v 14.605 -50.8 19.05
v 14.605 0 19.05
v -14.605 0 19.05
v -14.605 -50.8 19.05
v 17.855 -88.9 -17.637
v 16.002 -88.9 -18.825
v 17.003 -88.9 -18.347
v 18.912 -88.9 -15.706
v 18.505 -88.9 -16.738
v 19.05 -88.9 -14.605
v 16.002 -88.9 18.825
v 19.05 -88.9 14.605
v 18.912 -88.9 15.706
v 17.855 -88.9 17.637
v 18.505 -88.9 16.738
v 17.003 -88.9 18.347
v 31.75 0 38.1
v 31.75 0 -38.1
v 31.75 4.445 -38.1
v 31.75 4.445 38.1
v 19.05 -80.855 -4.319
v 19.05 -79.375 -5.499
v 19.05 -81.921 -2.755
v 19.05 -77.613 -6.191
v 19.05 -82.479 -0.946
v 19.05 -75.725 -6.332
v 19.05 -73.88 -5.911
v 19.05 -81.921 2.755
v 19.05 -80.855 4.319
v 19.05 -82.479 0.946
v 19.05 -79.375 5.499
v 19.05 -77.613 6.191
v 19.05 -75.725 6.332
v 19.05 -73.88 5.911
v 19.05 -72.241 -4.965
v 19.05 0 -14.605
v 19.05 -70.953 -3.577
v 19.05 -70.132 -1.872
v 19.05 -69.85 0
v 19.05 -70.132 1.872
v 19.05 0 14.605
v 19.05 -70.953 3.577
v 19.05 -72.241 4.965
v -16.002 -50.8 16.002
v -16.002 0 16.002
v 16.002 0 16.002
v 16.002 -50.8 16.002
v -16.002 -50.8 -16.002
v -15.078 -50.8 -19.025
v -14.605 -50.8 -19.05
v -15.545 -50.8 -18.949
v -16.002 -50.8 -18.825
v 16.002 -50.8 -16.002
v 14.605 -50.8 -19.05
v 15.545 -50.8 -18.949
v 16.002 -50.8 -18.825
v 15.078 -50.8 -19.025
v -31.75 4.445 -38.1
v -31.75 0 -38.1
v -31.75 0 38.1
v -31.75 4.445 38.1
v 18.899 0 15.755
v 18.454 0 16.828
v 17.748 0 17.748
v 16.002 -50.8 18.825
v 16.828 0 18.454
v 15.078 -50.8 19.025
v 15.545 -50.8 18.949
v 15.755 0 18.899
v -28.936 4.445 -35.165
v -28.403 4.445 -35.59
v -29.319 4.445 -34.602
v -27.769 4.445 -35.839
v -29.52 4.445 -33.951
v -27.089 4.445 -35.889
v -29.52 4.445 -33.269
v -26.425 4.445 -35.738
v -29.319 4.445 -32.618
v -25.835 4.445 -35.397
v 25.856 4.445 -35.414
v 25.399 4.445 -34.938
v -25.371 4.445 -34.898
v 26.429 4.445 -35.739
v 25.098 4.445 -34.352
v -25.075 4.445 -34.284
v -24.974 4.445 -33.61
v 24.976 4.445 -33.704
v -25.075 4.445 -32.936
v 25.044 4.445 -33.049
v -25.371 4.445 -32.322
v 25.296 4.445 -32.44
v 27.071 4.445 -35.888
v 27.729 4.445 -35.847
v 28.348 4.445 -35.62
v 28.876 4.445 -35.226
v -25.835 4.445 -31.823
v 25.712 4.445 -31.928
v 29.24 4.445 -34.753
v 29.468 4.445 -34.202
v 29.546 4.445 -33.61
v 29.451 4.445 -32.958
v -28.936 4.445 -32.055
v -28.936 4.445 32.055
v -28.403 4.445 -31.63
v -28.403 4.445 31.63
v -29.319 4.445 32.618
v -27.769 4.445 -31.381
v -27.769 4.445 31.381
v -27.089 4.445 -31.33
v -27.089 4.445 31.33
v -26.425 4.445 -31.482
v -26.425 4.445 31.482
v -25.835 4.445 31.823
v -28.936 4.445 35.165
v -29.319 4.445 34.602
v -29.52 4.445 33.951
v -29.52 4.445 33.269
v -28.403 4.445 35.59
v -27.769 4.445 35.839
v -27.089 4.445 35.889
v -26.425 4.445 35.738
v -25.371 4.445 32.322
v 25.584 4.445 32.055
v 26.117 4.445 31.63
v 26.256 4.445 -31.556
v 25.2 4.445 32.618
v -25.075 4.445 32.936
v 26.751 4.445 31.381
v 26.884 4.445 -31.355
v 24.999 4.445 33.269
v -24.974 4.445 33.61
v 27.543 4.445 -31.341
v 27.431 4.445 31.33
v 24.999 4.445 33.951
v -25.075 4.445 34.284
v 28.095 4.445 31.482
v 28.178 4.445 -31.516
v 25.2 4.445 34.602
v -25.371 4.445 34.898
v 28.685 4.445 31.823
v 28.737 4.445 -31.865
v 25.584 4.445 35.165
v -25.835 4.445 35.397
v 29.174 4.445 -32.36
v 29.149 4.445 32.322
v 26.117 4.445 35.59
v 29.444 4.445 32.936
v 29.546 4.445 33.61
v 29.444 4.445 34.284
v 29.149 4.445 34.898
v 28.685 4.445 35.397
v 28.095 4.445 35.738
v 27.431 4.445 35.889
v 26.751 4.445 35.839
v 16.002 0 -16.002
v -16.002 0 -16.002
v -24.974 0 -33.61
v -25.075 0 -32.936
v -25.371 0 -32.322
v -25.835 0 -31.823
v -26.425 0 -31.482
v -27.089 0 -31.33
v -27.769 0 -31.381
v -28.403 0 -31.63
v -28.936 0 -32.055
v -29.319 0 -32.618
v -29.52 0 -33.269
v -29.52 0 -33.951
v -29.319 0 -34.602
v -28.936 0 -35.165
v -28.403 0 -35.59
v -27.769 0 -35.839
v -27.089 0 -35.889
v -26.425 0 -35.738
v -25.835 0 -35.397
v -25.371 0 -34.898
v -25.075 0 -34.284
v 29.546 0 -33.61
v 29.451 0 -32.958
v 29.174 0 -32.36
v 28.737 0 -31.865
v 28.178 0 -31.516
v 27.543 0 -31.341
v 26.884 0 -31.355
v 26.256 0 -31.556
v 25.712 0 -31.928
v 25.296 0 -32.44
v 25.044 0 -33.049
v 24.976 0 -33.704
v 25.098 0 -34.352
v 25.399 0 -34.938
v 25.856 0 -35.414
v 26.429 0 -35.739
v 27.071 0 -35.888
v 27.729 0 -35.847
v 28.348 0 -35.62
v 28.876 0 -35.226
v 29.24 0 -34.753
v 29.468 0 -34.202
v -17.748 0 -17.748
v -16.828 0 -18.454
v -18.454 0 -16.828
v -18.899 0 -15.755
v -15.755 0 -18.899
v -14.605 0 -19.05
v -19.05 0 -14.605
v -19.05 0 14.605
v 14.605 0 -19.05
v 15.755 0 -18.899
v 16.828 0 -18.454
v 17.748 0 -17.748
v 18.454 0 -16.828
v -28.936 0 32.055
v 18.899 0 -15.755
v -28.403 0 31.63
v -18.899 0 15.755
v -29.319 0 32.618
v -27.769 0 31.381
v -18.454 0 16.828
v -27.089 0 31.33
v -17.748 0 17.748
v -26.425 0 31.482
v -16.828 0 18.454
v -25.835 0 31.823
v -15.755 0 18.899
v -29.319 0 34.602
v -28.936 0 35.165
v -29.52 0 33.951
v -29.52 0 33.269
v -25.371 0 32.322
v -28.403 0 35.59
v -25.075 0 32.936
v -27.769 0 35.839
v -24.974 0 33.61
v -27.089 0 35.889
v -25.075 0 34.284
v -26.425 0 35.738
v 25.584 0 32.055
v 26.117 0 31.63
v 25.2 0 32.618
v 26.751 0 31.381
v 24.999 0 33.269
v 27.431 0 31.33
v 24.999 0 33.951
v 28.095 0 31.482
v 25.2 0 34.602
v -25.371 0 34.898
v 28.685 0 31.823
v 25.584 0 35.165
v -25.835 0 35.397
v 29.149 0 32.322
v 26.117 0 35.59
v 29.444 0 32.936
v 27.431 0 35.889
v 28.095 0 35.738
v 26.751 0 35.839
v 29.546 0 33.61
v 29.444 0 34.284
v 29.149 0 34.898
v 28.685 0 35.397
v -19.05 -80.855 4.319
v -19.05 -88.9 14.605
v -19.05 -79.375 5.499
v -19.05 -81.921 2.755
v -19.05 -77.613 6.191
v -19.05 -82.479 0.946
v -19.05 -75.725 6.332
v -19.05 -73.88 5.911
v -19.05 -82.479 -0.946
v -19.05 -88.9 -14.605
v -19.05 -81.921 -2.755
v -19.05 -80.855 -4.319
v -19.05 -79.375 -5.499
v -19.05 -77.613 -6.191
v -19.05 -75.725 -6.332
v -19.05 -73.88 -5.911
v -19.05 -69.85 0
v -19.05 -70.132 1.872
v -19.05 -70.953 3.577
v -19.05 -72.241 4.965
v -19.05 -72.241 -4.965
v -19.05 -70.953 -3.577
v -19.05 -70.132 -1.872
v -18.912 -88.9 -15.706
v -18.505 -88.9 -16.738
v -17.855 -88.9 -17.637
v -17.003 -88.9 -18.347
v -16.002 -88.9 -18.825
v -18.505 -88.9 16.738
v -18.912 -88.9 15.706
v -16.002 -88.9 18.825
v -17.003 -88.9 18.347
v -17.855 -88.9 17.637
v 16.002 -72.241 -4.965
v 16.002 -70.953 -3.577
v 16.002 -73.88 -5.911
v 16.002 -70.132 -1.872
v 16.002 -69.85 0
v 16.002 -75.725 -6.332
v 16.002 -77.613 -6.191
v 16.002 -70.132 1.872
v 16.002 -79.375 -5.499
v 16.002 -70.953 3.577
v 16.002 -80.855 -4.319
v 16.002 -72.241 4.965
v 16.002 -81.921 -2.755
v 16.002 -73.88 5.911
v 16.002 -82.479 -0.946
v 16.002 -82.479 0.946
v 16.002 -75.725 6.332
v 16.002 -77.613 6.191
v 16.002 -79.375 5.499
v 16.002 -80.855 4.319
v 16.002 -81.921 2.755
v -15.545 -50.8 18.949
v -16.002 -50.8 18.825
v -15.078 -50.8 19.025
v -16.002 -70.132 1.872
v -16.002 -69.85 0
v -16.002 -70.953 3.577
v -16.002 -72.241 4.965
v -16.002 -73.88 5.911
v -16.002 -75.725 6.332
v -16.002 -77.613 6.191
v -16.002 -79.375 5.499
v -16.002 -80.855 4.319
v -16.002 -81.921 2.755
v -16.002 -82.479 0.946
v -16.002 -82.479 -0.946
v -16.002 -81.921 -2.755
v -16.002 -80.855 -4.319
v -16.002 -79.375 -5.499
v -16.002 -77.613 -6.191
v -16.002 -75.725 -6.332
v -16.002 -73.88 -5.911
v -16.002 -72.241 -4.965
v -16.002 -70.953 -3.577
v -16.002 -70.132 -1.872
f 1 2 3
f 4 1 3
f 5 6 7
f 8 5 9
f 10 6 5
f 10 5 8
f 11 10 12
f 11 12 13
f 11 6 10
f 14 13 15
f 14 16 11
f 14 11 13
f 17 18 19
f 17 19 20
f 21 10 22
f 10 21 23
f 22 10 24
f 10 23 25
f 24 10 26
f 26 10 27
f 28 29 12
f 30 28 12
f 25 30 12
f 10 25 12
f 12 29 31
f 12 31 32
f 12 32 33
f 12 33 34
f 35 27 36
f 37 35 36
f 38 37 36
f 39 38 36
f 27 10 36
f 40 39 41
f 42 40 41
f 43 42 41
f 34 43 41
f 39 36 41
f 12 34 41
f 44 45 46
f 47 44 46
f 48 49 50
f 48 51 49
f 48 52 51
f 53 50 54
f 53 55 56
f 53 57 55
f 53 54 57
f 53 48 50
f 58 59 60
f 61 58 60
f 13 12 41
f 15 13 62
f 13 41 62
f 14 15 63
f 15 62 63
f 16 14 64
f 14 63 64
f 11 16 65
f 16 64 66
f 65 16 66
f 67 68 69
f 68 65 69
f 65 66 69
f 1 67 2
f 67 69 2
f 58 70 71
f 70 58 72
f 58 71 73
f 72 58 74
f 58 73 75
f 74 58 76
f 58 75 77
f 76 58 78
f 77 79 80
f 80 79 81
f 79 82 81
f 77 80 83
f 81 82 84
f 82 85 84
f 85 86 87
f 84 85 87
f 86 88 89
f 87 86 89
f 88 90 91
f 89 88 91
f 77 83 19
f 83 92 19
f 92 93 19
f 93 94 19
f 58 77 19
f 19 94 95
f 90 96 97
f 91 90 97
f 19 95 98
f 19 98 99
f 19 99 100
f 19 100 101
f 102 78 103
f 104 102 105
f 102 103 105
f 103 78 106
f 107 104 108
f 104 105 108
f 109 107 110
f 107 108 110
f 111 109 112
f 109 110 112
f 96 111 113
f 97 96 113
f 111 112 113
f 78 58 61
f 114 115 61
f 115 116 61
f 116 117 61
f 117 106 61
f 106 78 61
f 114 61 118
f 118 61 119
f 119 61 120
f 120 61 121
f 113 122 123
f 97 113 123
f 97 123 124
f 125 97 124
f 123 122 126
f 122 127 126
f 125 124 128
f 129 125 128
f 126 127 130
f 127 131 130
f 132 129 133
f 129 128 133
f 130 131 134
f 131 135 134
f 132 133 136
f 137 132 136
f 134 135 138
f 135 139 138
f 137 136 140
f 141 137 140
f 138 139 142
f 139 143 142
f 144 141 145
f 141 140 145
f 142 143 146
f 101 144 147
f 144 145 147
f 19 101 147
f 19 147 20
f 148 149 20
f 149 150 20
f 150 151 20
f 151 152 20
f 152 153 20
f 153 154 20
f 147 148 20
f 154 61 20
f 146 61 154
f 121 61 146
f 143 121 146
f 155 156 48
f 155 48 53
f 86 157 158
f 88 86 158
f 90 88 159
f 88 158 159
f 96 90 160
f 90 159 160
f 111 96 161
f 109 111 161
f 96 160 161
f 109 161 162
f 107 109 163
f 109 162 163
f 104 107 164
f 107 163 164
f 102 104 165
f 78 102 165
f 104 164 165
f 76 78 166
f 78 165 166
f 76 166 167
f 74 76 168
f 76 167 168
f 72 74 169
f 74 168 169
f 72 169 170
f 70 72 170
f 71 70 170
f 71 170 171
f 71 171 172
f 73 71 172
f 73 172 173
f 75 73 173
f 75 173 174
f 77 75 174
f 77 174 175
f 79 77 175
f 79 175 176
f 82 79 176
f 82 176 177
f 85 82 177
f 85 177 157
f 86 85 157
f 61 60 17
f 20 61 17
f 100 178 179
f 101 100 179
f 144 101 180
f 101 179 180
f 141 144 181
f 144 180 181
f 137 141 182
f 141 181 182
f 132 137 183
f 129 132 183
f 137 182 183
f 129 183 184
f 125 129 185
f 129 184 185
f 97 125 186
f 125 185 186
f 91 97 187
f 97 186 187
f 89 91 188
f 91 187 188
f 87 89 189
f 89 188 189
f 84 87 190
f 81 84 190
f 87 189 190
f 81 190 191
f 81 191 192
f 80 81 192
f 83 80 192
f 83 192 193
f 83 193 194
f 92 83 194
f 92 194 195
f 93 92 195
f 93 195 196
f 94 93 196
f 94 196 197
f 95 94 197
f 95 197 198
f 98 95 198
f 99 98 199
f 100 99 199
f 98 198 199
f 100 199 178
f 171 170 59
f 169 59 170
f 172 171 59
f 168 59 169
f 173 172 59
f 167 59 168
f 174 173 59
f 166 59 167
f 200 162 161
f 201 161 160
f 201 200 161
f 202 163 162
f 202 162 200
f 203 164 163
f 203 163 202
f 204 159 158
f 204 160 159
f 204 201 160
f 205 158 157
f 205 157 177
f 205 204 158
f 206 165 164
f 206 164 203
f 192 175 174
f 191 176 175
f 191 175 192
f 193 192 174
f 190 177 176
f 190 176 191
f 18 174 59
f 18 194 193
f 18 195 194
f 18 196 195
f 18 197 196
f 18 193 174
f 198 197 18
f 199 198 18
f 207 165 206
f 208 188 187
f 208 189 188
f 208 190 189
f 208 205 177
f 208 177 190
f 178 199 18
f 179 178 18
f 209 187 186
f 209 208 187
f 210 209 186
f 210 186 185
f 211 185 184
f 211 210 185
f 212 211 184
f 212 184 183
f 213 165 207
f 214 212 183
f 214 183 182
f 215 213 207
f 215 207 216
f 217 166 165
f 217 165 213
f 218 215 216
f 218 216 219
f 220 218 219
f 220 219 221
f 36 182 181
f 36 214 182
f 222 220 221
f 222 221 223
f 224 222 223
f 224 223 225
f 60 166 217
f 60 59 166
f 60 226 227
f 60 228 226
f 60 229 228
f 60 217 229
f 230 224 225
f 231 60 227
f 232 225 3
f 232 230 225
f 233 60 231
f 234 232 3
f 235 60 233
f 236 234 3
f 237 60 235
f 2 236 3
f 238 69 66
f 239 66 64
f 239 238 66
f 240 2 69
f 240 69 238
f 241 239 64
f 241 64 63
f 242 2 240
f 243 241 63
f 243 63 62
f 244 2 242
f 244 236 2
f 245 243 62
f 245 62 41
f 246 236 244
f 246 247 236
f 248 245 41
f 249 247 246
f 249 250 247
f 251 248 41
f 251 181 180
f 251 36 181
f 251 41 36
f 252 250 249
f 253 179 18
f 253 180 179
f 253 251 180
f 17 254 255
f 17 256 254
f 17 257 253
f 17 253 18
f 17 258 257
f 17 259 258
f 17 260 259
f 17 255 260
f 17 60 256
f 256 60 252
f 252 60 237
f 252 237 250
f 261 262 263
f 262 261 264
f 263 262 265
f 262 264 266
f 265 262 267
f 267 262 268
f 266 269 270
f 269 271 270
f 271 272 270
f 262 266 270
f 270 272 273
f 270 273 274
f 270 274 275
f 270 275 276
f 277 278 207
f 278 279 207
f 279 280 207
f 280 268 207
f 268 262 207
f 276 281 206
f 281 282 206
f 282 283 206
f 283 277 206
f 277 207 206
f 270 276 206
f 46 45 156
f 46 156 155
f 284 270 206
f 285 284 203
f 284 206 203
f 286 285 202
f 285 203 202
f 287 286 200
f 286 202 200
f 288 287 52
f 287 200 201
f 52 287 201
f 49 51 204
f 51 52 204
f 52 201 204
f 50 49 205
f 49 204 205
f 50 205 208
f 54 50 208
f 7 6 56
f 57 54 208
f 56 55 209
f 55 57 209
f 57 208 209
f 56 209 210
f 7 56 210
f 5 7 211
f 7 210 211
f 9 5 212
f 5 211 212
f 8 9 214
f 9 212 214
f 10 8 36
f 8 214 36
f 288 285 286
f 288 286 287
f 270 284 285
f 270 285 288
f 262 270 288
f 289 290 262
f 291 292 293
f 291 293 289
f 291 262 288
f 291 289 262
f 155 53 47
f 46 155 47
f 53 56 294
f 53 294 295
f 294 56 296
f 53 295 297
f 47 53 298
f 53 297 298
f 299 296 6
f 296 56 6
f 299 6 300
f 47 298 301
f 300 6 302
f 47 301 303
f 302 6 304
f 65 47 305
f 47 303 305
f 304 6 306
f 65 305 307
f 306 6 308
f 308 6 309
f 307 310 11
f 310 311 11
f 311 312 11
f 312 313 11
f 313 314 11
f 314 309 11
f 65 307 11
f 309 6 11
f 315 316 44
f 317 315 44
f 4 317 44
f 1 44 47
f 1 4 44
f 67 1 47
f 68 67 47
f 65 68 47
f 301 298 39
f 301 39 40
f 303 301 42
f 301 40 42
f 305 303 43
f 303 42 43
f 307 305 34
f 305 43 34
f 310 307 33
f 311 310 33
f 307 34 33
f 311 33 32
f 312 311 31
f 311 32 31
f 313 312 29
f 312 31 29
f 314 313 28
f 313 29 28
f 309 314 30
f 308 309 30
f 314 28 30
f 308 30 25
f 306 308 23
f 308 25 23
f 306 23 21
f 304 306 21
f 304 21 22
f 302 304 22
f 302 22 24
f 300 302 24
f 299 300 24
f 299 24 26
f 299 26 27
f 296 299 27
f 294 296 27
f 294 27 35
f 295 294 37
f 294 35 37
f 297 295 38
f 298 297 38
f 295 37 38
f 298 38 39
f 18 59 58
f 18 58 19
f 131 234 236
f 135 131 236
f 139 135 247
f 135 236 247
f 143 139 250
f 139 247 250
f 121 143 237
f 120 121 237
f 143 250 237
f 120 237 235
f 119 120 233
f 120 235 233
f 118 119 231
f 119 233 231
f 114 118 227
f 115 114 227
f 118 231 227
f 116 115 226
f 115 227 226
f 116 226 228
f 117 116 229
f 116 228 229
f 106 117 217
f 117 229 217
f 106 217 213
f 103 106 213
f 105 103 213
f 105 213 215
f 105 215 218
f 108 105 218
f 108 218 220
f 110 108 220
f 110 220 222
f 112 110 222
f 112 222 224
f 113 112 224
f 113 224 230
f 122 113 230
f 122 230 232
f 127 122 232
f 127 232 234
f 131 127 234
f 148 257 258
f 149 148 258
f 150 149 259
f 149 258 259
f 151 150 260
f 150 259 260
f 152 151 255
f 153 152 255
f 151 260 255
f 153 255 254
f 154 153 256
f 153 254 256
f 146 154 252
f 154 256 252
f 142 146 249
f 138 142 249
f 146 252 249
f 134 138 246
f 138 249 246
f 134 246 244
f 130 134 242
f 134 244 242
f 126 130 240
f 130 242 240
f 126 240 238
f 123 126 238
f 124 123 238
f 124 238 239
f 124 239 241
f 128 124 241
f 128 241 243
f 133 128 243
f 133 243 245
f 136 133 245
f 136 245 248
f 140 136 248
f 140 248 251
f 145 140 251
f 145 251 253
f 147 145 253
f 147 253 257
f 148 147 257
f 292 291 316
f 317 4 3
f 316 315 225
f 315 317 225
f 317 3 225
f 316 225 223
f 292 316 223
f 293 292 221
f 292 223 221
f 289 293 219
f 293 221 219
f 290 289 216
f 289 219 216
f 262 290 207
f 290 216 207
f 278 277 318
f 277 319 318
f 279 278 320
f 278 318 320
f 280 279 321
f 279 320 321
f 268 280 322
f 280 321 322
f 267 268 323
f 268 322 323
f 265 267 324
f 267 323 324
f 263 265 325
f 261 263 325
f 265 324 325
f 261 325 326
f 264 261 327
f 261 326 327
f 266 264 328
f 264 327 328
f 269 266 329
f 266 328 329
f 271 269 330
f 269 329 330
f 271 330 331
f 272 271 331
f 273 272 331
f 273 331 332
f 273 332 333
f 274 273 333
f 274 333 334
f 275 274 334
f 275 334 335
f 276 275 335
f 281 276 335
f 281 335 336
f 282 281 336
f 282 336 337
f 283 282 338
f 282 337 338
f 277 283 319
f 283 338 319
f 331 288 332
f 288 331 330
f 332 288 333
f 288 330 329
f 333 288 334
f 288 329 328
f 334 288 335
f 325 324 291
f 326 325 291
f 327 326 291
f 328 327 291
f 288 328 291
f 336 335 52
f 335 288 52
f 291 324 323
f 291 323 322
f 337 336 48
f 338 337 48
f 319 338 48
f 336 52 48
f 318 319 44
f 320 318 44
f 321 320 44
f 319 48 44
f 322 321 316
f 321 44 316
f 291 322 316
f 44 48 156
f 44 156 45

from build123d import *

# Parameters (mm, degrees)
F0_W      = 32.004
F0_H      = 32.004
F1_DEPTH  = 88.9
F2_R      = 6.35
F3_DEPTH  = 24.384
F5_W      = 32.004
F5_H      = 50.8
F6_DEPTH  = 38.1
F7_W      = 63.5
F7_H      = 76.2
F8_DEPTH  = 4.445
F9_R      = 2.286
F10_DEPTH = 25.4


with BuildPart() as f1:
    # F0 (on Front) → F1 (new body)
    with BuildSketch(Plane.XZ):
        with BuildLine():
            ThreePointArc((19.05, 14.605), (17.74809, 17.74809), (14.605, 19.05))
            Line((14.605, 19.05), (-14.605, 19.05))
            ThreePointArc((-14.605, 19.05), (-17.74809, 17.74809), (-19.05, 14.605))
            Line((-19.05, 14.605), (-19.05, -14.605))
            ThreePointArc((-19.05, -14.605), (-17.74809, -17.74809), (-14.605, -19.05))
            Line((-14.605, -19.05), (14.605, -19.05))
            ThreePointArc((14.605, -19.05), (17.74809, -17.74809), (19.05, -14.605))
            Line((19.05, -14.605), (19.05, 14.605))
        make_face()
        Rectangle(F0_W, F0_H, mode=Mode.SUBTRACT)
    extrude(amount=F1_DEPTH)

    # F2 (on Right) → F3 (cut, symmetric)
    with BuildSketch(Plane.YZ):
        with Locations((-76.2, 0)):
            Circle(F2_R)
    extrude(amount=F3_DEPTH, both=True, mode=Mode.SUBTRACT)

    # F5 (on offset) → F6 (cut)
    with BuildSketch(Plane.XZ.offset(88.9)):
        Rectangle(F5_W, F5_H)
    extrude(amount=-F6_DEPTH, mode=Mode.SUBTRACT)

    # F7 (on Front) → F8 (join)
    with BuildSketch(Plane.XZ):
        Rectangle(F7_W, F7_H)
    extrude(amount=-F8_DEPTH)

    # F9 (on face) → F10 (cut)
    with BuildSketch(Plane.XZ):
        with Locations((27.259872, 33.609872)):
            Circle(F9_R)
        with BuildLine():
            ThreePointArc((28.876318, -35.226318), (29.371861, -34.484686), (29.545872, -33.609872))
            ThreePointArc((29.545872, -33.609872), (25.147883, -32.735058), (28.876318, -35.226318))
        make_face()
        with Locations((-27.259872, -33.609872)):
            Circle(F9_R)
        with Locations((-27.259872, 33.609872)):
            Circle(F9_R)
    extrude(amount=-F10_DEPTH, mode=Mode.SUBTRACT)


solid = f1.part
